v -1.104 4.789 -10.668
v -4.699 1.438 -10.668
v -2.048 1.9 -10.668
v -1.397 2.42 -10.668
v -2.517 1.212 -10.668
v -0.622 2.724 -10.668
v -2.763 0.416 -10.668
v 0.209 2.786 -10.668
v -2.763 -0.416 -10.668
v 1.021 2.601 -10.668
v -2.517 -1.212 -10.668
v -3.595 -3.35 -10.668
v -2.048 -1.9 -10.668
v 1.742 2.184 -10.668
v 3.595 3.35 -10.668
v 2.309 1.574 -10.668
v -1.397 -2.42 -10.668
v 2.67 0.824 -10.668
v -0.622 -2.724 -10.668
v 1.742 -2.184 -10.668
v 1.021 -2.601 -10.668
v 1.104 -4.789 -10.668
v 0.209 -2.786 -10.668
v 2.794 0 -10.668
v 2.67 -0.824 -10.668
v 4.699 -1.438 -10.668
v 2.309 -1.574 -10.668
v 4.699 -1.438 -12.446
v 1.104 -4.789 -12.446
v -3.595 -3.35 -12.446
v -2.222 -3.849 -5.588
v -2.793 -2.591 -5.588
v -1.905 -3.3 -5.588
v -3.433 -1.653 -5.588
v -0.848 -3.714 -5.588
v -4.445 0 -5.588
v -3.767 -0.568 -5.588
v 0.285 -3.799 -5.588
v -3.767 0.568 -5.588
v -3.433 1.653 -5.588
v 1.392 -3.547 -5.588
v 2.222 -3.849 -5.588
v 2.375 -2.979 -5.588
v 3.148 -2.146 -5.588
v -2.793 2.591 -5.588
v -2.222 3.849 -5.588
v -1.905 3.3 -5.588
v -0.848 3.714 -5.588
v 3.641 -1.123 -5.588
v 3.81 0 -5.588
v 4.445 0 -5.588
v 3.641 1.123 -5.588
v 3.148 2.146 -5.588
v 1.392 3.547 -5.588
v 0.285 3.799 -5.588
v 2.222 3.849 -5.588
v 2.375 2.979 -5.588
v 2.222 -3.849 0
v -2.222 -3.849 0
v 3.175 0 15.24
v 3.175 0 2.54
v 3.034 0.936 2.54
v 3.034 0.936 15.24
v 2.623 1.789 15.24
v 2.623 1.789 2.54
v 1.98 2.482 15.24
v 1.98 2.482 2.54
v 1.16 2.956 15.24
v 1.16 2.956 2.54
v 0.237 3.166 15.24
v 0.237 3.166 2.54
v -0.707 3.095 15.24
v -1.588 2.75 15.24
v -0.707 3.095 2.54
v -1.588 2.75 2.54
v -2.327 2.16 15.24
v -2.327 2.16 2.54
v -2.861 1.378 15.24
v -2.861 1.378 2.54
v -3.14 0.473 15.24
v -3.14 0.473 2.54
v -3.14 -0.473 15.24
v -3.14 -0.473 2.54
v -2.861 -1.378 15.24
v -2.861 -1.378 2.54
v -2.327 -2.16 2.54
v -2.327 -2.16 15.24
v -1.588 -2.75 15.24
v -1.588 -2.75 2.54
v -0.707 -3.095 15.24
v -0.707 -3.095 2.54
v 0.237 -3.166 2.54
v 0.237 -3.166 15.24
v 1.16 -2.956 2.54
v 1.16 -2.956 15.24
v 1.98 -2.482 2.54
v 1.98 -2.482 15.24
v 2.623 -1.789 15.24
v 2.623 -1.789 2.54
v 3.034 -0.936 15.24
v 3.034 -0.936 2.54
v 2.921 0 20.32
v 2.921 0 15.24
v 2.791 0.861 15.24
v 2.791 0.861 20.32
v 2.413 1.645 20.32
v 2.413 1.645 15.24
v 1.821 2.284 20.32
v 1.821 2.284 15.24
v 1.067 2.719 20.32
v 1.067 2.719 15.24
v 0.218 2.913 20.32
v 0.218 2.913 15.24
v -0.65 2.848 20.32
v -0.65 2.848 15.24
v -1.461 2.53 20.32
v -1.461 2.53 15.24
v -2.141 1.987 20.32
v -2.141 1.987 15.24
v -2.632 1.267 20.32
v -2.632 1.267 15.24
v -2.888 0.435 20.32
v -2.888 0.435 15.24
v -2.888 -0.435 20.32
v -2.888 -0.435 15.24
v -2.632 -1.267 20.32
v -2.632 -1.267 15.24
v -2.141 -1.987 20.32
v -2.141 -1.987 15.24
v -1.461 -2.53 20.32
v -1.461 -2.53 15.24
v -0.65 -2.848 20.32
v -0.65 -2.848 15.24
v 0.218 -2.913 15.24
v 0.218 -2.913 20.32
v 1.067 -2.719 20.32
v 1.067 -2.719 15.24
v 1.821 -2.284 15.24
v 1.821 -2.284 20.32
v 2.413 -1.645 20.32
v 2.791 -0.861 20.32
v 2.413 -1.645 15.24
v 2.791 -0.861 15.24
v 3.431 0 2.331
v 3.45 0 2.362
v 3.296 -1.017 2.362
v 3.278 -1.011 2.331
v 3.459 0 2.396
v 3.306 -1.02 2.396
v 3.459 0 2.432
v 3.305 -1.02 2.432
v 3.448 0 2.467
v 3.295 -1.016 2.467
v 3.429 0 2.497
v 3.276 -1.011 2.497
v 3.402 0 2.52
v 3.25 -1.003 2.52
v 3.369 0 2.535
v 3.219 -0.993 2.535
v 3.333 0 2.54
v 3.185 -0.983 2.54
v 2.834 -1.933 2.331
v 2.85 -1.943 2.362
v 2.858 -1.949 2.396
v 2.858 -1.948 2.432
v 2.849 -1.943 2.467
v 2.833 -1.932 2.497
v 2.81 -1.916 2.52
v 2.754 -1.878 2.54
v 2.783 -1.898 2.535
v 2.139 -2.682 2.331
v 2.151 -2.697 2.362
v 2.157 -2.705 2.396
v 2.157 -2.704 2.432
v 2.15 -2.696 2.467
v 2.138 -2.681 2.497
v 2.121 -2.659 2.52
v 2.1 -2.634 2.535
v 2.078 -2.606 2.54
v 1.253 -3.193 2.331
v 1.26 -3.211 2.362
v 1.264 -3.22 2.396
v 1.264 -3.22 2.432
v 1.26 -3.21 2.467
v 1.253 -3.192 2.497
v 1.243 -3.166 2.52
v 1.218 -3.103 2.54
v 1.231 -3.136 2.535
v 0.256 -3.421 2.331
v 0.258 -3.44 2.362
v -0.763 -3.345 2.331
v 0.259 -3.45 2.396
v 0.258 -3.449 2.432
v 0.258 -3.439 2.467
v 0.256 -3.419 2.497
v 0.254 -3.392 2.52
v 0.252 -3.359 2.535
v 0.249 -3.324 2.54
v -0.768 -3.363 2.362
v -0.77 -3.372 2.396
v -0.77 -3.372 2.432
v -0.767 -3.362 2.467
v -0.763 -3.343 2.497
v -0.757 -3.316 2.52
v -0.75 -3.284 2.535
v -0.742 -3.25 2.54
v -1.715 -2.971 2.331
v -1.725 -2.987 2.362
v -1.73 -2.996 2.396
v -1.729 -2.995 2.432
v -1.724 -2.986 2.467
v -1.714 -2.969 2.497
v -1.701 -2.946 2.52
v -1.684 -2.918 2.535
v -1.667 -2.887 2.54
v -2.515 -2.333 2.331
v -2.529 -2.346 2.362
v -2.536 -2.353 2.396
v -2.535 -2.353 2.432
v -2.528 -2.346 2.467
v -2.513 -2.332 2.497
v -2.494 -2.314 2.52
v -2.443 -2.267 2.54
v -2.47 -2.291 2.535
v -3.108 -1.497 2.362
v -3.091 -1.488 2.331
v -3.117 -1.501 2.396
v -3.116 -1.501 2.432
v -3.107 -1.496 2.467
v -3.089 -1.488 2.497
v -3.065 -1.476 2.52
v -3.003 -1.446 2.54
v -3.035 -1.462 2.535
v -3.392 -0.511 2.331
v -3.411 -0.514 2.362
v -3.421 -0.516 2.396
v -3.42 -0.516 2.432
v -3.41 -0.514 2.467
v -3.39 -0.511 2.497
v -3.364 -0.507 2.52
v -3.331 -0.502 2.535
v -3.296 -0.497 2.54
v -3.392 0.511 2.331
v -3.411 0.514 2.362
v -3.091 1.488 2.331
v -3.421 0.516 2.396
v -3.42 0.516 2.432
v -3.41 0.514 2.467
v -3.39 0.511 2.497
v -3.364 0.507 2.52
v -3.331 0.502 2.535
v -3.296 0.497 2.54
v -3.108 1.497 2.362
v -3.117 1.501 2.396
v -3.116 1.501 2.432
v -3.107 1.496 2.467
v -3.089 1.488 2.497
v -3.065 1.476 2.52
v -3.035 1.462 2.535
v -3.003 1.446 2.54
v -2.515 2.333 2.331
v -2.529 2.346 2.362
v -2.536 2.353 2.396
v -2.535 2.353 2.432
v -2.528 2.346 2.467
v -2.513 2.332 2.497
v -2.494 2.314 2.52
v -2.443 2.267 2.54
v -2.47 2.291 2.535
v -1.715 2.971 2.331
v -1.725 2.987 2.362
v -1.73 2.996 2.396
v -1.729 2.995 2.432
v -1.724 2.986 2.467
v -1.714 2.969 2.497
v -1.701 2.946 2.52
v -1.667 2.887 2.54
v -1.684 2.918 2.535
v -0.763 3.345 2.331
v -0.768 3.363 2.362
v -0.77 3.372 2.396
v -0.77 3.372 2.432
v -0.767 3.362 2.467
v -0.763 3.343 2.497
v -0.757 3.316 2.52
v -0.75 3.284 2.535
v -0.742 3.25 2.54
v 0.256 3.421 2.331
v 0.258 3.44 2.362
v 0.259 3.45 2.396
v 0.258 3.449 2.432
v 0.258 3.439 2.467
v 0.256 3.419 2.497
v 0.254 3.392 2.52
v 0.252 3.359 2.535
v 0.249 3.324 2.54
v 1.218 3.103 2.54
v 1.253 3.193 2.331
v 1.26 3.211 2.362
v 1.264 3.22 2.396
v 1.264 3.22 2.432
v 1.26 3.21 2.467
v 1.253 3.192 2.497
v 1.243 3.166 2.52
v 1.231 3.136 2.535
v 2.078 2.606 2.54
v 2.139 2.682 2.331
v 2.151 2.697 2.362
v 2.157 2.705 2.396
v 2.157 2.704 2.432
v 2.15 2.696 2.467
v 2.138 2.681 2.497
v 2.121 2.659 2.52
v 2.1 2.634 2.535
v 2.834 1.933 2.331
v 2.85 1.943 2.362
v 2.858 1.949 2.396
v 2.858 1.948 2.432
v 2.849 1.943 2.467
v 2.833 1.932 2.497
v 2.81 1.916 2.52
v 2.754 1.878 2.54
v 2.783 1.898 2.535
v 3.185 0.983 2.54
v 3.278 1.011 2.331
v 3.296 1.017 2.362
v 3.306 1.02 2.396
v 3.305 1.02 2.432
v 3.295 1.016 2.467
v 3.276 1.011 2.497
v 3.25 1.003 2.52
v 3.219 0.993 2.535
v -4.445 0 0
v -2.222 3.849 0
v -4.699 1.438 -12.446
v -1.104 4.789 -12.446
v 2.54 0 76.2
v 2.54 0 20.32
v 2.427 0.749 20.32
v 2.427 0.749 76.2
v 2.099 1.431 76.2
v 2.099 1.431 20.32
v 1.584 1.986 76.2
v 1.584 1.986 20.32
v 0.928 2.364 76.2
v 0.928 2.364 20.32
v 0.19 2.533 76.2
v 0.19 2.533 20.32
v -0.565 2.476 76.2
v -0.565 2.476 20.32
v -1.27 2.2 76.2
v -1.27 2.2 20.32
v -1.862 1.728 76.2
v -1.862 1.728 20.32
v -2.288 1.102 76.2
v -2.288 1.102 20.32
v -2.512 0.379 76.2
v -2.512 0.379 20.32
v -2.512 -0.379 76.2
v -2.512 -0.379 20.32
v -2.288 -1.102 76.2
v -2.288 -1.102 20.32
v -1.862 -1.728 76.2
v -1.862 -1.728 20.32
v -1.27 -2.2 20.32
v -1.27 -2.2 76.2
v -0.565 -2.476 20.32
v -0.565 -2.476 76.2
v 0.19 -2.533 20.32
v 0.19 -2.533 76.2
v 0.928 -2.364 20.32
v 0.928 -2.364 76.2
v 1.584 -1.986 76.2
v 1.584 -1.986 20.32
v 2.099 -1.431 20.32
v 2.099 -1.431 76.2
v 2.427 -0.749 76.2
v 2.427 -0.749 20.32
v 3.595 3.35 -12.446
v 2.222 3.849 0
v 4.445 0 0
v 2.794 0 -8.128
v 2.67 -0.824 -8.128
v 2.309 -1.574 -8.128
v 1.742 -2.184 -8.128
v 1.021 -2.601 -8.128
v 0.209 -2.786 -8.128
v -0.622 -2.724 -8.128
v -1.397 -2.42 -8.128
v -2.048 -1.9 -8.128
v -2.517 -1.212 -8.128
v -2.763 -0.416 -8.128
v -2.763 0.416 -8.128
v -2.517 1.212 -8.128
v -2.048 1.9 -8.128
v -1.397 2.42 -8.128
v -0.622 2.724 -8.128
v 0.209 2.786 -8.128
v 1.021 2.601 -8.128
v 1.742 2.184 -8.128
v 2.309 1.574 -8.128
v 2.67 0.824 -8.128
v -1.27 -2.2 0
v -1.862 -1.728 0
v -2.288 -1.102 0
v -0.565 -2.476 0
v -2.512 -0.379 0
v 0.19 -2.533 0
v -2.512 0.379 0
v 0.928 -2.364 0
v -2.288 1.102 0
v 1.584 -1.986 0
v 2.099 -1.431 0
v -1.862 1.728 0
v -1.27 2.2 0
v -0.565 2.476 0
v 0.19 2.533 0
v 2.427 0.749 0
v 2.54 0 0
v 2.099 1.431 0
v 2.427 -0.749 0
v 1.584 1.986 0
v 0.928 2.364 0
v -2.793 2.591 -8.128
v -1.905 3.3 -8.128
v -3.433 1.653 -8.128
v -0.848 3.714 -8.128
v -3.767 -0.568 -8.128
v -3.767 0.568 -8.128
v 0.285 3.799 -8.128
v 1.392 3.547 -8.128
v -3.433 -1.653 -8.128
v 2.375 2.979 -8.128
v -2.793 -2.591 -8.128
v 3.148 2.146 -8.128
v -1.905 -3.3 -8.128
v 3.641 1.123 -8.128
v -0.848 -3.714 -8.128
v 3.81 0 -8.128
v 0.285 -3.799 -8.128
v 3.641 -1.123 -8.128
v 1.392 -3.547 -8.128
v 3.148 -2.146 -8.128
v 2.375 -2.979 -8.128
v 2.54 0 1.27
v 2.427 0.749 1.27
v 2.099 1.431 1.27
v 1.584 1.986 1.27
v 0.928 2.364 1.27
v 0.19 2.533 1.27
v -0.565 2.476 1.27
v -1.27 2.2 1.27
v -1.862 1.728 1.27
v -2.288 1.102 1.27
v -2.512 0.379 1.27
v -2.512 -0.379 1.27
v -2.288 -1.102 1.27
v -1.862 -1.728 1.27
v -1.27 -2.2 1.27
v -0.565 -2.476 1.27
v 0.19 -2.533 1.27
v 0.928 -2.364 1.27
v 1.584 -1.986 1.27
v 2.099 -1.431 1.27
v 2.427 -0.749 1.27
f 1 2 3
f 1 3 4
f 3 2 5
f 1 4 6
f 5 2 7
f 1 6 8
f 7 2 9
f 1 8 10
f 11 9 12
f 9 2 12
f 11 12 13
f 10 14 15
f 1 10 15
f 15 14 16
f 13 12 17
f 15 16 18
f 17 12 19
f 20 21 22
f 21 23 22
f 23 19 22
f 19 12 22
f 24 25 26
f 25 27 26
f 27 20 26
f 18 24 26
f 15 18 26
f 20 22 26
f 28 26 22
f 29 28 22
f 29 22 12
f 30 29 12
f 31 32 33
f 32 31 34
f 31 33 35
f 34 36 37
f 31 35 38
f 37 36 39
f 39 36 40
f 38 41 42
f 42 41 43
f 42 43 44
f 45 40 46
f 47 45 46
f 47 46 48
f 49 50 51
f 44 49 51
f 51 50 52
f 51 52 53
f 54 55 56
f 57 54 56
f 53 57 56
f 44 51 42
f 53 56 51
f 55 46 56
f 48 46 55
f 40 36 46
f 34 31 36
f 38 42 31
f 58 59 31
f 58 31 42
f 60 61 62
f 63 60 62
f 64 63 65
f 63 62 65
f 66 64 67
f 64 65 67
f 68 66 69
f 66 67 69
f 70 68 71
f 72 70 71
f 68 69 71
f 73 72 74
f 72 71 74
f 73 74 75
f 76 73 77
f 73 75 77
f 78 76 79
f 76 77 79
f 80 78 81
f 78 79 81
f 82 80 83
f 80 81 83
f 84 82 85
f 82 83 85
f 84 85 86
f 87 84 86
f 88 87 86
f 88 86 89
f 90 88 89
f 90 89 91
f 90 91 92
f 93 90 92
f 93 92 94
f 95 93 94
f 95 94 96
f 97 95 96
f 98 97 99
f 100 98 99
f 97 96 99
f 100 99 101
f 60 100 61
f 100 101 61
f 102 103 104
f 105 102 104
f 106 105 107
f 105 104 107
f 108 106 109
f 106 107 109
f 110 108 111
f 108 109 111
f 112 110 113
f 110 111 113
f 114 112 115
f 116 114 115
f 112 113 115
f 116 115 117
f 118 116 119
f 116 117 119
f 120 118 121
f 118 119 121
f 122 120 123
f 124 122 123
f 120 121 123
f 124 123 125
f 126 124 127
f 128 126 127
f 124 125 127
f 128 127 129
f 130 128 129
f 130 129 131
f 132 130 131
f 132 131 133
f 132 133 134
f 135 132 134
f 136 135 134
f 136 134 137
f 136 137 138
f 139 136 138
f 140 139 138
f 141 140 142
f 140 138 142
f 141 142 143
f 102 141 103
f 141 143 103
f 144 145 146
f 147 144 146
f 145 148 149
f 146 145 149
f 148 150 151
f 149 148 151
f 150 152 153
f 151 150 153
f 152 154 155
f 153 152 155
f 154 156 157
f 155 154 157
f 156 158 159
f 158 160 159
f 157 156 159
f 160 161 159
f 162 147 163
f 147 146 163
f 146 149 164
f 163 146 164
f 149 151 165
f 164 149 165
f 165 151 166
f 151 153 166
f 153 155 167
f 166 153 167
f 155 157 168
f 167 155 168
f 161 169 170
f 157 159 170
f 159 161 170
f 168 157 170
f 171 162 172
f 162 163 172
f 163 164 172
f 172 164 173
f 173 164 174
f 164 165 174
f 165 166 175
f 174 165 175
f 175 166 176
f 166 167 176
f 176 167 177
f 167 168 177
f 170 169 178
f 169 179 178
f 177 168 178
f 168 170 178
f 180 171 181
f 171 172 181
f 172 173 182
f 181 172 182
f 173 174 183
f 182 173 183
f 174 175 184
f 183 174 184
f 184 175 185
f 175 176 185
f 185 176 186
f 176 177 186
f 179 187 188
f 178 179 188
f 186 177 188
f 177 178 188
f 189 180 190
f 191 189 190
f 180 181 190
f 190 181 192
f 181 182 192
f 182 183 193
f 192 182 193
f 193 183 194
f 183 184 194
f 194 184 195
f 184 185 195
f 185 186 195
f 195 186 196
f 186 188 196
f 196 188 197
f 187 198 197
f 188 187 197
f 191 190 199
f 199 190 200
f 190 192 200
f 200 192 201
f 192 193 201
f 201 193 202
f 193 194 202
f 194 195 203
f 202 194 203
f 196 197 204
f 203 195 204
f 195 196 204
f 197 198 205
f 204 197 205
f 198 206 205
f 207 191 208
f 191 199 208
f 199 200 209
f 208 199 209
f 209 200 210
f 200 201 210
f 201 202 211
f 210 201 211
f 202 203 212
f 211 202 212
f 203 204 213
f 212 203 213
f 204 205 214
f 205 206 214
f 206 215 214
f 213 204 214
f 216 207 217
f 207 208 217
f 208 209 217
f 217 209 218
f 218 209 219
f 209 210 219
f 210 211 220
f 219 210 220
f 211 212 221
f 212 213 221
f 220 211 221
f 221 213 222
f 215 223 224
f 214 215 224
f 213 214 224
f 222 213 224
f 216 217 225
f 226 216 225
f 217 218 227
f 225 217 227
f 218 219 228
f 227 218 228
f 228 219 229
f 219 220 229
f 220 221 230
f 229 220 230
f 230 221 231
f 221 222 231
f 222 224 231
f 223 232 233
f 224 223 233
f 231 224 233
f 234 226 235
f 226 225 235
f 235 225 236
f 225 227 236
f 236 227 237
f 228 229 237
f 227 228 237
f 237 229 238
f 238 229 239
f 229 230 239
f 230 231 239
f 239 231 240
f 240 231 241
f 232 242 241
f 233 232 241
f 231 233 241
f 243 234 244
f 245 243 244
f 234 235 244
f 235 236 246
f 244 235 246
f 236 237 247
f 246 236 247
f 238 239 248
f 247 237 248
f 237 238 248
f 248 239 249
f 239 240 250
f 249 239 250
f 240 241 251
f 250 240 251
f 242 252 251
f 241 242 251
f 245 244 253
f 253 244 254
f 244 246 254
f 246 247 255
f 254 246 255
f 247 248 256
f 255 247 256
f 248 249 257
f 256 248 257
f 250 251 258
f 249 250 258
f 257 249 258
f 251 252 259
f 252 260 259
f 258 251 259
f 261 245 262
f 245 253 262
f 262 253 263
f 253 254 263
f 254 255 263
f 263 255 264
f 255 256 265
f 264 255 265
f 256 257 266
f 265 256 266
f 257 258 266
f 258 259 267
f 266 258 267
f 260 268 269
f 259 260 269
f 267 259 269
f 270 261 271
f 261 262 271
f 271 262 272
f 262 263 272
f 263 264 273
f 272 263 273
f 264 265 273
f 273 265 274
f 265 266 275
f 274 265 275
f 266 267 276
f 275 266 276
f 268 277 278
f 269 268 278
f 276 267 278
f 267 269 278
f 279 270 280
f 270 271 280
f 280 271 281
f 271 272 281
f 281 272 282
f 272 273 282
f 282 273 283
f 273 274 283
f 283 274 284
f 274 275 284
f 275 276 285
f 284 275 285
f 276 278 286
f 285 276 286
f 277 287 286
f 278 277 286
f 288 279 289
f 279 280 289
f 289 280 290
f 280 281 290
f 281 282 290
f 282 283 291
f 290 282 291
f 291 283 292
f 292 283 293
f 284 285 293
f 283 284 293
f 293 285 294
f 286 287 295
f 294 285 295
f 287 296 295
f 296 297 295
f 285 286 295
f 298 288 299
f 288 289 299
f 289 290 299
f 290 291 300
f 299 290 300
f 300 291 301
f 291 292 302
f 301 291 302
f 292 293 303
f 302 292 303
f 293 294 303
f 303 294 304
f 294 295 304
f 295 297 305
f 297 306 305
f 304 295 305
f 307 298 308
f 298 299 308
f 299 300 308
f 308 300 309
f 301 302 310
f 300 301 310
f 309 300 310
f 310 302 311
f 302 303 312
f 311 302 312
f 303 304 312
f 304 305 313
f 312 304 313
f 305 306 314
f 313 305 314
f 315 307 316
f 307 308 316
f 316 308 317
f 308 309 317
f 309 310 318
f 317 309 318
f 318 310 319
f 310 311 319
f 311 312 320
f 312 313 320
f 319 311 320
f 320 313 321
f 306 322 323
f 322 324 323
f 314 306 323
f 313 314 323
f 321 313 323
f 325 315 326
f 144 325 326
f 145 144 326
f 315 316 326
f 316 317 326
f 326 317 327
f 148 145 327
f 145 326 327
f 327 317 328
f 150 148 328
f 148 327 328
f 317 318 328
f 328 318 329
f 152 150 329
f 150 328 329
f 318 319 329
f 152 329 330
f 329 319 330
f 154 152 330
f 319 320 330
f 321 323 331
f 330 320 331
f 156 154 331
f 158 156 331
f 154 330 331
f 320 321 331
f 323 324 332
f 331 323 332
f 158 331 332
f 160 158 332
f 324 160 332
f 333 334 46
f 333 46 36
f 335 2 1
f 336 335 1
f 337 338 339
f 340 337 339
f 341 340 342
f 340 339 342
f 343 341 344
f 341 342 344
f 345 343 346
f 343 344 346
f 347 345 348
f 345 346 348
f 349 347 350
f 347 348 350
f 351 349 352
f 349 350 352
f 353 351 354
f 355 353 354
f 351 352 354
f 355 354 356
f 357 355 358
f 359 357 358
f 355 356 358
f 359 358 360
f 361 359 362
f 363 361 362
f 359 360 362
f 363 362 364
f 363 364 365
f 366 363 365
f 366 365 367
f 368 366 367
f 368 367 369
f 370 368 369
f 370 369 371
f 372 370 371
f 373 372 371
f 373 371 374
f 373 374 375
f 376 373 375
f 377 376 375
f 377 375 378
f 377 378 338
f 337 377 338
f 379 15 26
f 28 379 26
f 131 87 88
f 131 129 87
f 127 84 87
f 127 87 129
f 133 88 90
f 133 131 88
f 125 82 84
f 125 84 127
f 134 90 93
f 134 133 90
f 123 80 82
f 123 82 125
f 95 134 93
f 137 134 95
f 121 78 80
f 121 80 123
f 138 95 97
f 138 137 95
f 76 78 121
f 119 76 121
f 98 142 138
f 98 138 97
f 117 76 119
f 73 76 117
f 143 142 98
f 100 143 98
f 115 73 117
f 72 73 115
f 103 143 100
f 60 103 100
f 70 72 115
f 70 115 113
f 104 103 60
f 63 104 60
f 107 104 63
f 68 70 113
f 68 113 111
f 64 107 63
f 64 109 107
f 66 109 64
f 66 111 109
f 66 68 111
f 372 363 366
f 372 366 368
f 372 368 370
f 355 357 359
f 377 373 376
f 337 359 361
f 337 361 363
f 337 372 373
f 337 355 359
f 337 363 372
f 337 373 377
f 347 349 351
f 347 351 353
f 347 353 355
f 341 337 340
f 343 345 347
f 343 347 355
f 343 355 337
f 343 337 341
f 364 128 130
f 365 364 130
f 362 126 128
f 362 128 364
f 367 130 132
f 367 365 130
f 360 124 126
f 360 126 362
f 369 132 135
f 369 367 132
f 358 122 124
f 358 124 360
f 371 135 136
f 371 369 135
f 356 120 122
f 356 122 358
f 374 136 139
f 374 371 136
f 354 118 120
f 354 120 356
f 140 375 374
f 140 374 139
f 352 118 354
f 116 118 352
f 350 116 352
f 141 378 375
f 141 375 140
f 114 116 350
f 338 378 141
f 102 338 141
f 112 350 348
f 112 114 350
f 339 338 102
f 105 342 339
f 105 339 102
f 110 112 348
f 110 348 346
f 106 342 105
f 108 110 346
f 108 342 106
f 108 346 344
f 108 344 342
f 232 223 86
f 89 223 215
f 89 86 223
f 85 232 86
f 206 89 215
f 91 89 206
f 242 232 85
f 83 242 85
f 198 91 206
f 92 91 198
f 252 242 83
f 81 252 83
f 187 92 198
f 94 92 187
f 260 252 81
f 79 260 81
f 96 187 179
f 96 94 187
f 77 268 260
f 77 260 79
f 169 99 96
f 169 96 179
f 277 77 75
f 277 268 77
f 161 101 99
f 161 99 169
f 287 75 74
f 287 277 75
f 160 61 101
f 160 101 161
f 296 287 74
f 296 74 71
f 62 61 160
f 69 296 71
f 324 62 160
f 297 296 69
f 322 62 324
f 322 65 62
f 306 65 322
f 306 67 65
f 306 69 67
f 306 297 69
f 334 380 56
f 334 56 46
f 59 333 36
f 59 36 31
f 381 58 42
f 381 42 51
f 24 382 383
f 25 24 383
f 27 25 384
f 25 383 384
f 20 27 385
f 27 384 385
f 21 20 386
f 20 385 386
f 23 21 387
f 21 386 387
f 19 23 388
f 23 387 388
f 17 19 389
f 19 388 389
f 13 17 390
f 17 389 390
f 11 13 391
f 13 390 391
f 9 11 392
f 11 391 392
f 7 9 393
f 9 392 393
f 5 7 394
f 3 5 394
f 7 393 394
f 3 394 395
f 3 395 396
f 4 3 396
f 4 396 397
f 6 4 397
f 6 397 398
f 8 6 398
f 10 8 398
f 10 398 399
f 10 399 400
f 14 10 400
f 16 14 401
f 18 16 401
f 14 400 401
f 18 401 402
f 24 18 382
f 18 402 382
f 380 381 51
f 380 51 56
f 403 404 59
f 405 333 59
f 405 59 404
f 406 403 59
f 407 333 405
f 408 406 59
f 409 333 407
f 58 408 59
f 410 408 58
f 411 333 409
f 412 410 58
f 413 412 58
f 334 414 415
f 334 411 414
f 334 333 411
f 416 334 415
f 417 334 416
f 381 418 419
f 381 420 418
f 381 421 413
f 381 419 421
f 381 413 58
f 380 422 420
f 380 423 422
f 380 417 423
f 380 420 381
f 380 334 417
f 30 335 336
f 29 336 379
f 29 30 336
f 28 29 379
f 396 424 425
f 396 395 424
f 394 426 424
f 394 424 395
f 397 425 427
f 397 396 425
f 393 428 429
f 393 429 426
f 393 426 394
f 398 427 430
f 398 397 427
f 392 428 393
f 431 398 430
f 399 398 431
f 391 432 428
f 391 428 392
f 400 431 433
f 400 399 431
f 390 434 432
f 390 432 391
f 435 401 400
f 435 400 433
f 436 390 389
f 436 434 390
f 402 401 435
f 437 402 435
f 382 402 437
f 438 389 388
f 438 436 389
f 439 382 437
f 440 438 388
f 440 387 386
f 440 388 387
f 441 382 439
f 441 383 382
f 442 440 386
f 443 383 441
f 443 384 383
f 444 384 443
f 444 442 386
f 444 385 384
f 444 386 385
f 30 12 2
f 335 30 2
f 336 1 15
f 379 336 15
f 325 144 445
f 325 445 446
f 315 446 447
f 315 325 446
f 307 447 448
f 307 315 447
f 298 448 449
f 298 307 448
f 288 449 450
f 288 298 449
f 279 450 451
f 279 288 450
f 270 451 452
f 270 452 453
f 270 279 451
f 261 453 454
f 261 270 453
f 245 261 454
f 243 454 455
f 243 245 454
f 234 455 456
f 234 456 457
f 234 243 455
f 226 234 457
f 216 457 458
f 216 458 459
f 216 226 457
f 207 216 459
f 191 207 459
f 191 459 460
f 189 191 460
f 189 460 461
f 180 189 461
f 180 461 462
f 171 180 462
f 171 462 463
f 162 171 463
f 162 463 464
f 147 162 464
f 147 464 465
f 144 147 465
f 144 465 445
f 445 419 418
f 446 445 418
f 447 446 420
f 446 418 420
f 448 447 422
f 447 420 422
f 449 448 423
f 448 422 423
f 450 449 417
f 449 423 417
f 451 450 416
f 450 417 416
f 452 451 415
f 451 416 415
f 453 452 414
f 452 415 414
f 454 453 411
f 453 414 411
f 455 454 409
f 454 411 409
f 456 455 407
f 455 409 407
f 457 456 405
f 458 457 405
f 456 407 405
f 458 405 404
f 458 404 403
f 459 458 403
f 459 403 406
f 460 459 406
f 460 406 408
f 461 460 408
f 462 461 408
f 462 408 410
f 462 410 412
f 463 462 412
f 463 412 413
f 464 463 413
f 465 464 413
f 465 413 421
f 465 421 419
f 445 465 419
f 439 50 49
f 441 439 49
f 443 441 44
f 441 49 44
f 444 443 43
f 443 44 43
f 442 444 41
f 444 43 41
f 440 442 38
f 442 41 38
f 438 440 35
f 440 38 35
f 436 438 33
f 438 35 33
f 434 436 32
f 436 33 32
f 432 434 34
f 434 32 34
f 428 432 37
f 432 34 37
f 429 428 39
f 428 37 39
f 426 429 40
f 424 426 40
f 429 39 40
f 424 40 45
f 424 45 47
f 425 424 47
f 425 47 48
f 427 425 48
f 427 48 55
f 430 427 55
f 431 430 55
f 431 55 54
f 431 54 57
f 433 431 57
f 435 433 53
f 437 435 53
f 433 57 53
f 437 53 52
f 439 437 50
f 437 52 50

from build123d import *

# Parameters (mm, degrees)
F0_R      = 2.54
F1_DEPTH  = 76.2
F3_DEPTH  = 5.588
F4_R      = 3.81
F5_DEPTH  = 2.54
F6_R      = 2.794
F7_DEPTH  = 2.54
F9_DEPTH  = 1.778
F11_R     = 2.54
F12_DEPTH = 1.27
F12_TAPER = -40
F13_R     = 0.127
F14_R     = 3.175
F15_DEPTH = 12.7
F16_R     = 2.921
F17_DEPTH = 5.08


with BuildPart() as f1:
    # F0 (on Top) → F1 (new body)
    with BuildSketch(Plane.XY):
        Circle(F0_R)
    extrude(amount=F1_DEPTH)

    # F2 (on Top) → F3 (join)
    with BuildSketch(Plane.XY):
        Polygon((2.2225, -3.8494829198), (4.445, 0), (2.2225, 3.8494829198), (-2.2225, 3.8494829198), (-4.445, 0), (-2.2225, -3.8494829198), align=None)
    extrude(amount=-F3_DEPTH)

    # F4 (on face) → F5 (join)
    with BuildSketch(Plane(origin=(0, 0, -5.588), x_dir=(1, 0, 0), z_dir=(0, 0, -1))):
        Circle(F4_R)
    extrude(amount=F5_DEPTH)

    # F6 (on face) → F7 (join)
    with BuildSketch(Plane(origin=(0, 0, -8.128), x_dir=(1, 0, 0), z_dir=(0, 0, -1))):
        Circle(F6_R)
    extrude(amount=F7_DEPTH)

    # F8 (on face) → F9 (join)
    with BuildSketch(Plane(origin=(0, 0, -10.668), x_dir=(1, 0, 0), z_dir=(0, 0, -1))):
        Polygon((-3.5949849635, 3.3503722934), (-4.699, -1.4381621579), (-1.1040150365, -4.7885344513), (3.5949849635, -3.3503722934), (4.699, 1.4381621579), (1.1040150365, 4.7885344513), align=None)
    extrude(amount=F9_DEPTH)



with BuildPart() as f12:
    # F11 (on offset) → F12 (new body)
    with BuildSketch(Plane.XY.offset(1.27)):
        Circle(F11_R)
    extrude(amount=F12_DEPTH, taper=F12_TAPER)

    # F13
    f13_edges = [f12.edges().sort_by_distance(p)[0] for p in [
        (-3.605657, 0, 2.54),
    ]]
    fillet(f13_edges, radius=F13_R)


with BuildPart() as f1_1:
    add(f1.part)

    add(f12.part)  # F15 merges F12
    # F14 (on face) → F15 (join)
    with BuildSketch(Plane.XY.offset(2.54)):
        Circle(F14_R)
    extrude(amount=F15_DEPTH)

    # F16 (on face) → F17 (join)
    with BuildSketch(Plane.XY.offset(15.24)):
        Circle(F16_R)
    extrude(amount=F17_DEPTH)


solid = f1_1.part
